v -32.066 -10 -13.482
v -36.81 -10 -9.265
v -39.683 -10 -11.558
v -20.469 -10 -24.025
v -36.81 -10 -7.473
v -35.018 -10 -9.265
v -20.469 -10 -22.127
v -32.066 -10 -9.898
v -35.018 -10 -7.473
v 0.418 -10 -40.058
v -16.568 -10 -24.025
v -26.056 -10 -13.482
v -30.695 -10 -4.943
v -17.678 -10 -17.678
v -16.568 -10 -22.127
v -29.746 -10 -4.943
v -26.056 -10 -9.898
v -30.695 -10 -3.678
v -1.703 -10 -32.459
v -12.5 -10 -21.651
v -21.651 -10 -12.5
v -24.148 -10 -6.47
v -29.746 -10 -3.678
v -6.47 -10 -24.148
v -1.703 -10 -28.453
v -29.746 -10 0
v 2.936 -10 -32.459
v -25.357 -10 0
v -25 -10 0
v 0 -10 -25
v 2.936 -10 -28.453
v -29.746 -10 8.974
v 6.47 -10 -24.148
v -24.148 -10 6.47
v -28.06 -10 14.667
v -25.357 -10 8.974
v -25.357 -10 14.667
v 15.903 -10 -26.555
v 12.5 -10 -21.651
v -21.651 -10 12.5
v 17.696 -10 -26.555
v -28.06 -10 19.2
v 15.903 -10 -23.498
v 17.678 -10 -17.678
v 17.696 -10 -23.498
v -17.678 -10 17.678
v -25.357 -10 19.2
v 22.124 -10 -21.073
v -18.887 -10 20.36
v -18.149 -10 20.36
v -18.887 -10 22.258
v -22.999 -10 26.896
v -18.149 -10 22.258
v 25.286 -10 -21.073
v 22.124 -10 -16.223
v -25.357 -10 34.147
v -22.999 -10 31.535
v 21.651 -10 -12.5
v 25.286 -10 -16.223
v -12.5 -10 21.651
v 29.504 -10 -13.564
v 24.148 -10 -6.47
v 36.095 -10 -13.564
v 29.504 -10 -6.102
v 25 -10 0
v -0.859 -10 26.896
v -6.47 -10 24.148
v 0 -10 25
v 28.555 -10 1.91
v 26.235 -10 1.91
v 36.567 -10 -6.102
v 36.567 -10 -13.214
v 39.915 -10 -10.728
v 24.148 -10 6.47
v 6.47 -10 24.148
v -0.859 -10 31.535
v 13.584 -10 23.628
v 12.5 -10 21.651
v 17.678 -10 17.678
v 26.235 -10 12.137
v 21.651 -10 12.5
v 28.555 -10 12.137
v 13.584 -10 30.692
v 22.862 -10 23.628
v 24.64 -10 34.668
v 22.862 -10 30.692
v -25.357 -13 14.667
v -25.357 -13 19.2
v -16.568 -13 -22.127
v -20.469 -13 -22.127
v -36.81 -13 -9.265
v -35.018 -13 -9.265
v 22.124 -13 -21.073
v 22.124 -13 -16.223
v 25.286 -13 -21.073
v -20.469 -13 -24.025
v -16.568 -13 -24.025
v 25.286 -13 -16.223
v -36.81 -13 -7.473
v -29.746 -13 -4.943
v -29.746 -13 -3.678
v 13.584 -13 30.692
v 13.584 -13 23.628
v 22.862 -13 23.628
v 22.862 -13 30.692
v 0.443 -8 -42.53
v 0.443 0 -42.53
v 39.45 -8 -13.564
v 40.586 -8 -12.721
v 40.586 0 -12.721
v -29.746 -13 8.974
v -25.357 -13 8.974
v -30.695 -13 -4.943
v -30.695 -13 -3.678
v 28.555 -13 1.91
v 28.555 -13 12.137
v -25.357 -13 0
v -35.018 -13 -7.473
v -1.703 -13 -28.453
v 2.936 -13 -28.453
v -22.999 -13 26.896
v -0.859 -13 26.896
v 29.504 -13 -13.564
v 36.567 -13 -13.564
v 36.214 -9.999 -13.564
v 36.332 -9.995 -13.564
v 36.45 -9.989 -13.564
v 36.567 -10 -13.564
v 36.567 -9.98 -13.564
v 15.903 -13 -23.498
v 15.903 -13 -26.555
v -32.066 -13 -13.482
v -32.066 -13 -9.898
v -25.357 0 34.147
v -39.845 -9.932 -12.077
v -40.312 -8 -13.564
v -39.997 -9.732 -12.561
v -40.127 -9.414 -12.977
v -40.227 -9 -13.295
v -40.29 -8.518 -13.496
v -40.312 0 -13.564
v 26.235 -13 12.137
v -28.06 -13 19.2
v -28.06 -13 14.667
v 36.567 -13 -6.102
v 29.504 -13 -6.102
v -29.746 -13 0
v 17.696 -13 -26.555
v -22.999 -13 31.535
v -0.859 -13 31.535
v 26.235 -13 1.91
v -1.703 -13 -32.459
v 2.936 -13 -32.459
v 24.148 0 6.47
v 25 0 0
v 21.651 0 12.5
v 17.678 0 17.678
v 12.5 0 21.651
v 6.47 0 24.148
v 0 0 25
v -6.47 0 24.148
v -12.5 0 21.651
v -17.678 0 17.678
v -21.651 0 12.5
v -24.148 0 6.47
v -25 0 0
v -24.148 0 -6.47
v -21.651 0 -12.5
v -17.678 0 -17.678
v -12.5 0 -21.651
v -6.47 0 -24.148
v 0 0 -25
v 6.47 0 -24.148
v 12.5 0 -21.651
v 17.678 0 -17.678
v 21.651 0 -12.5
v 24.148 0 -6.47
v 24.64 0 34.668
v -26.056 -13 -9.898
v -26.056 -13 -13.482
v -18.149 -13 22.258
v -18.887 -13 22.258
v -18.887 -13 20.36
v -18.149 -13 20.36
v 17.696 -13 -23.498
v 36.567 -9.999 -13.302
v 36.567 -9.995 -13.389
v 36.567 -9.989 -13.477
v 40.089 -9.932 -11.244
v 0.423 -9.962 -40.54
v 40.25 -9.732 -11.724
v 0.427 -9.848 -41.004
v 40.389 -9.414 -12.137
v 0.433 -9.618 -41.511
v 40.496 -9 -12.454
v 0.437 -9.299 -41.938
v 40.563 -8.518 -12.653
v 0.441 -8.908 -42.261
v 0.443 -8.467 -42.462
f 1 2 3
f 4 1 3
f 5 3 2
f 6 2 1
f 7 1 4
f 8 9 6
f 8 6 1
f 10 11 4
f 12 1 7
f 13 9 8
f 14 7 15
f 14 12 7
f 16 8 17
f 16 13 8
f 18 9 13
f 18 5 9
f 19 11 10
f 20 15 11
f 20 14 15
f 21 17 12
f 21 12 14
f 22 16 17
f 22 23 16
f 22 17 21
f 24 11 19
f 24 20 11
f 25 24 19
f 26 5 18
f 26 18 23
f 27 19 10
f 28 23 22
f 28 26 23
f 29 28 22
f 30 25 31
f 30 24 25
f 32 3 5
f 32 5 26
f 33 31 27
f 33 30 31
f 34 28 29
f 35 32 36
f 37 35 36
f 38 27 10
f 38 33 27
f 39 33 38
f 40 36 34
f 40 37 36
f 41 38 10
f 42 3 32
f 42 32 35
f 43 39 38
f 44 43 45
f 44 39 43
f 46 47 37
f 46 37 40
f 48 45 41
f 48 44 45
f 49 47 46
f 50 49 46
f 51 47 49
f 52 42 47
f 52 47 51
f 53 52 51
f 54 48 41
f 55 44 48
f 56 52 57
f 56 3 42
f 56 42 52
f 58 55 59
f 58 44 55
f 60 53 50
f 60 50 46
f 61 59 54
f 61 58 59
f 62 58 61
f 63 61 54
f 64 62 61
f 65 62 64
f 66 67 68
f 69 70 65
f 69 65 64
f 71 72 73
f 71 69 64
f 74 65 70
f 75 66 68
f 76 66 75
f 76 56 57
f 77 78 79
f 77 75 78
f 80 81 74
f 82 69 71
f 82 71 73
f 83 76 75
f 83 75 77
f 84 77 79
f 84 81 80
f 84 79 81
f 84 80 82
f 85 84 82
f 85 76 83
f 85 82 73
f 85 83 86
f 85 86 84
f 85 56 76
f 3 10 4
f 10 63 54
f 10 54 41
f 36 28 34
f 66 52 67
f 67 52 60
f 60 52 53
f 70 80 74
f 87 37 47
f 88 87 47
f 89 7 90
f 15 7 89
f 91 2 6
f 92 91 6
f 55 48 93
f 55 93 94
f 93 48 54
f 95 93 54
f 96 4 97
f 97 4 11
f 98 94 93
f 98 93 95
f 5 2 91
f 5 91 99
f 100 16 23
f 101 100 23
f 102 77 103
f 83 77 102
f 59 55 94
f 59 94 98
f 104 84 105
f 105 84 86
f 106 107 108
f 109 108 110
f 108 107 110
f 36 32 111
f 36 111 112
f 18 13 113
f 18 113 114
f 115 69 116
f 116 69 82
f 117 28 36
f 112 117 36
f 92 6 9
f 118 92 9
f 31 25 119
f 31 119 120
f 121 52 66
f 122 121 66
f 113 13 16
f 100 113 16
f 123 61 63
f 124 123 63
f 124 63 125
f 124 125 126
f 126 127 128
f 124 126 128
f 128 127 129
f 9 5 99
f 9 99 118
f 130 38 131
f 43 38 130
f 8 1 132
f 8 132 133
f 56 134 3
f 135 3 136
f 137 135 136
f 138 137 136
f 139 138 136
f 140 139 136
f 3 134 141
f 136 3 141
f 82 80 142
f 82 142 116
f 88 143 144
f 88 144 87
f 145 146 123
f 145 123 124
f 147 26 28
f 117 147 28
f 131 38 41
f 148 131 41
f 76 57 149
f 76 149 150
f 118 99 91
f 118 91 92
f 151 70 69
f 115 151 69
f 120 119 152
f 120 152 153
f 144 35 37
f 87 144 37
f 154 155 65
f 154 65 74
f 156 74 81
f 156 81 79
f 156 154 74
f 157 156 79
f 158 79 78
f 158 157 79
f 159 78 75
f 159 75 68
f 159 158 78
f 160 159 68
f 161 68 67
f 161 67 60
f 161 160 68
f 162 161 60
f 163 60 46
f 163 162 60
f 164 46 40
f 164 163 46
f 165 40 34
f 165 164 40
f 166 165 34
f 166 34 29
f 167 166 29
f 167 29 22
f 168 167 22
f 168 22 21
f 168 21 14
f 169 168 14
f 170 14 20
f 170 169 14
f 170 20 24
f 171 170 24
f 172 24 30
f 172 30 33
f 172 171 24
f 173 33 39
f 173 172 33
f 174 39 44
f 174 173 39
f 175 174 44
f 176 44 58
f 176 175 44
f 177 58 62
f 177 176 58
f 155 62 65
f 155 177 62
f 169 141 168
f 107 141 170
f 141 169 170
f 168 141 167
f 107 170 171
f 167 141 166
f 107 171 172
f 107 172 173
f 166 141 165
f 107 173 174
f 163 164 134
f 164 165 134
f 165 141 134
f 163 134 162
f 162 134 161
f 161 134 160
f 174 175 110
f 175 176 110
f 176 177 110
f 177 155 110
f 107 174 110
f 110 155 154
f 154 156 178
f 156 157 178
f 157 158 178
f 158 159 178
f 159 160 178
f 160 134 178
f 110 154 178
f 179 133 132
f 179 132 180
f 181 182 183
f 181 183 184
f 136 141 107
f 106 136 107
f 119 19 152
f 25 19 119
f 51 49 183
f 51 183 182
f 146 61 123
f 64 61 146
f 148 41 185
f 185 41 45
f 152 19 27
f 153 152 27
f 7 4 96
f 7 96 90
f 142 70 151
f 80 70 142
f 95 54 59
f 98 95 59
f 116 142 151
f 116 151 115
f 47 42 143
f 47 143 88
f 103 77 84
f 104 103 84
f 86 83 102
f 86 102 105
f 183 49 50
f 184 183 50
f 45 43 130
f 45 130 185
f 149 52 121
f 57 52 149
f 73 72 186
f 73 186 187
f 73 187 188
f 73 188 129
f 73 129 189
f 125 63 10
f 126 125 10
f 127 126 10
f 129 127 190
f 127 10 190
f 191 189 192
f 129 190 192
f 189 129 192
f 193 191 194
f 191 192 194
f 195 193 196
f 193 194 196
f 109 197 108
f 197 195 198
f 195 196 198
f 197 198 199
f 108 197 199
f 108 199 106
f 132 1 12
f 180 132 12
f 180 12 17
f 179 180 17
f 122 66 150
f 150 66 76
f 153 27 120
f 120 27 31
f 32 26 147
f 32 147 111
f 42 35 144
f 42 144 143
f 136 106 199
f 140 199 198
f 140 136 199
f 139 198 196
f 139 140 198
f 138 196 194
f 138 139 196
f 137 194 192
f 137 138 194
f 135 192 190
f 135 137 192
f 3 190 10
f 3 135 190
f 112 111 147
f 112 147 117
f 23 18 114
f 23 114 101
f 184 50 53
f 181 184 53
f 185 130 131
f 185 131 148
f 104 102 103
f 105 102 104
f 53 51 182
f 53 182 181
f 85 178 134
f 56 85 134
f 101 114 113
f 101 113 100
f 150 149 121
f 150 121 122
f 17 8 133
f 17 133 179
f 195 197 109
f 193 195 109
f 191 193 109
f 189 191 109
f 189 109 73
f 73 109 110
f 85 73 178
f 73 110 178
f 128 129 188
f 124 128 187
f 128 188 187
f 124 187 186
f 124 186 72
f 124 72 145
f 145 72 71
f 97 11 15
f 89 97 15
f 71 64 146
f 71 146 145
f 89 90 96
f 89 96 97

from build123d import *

# Parameters (mm, degrees)
F0_R         = 25
F1_DEPTH     = 10
F2_W         = 0.9488426149
F2_H         = 1.2651239522
F2_W_2       = 6.0093384236
F2_H_2       = 3.584517166
F2_W_3       = 3.9007980376
F2_H_3       = 1.8976870924
F2_W_4       = 4.6387878247
F2_H_4       = 4.0062256157
F2_W_5       = 1.7922576517
F2_H_5       = 3.0573830009
F2_W_6       = 7.0636067539
F2_H_6       = 7.4619053196
F2_W_7       = 3.1628105789
F2_H_7       = 4.8496406525
F2_W_8       = 2.3193918169
F2_H_8       = 10.2264162851
F2_W_9       = 9.2775728554
F2_H_9       = 7.0636067539
F2_W_10      = 22.1396633424
F2_H_10      = 4.6387854964
F2_W_11      = 2.7022243196
F2_H_11      = 4.5333597809
F2_W_12      = 0.7379893214
F2_H_12      = 1.8976833671
F2_W_13      = 4.3890562559
F2_H_13      = 8.9737139642
F2_W_14      = 1.7922595143
F2_H_14      = 1.7922581173
F3_DEPTH     = 3
F4_T1_DEPTH  = 60
F4_T6_DEPTH  = 60
F4_T12_DEPTH = 60
F4_T18_DEPTH = 60


# Not quite as in the source:
# - a fillet or chamfer that OpenCascade refuses, or shapes differently, is made with other operations: its cross-section is extruded or revolved along the edge and cut away or added


with BuildPart() as f1:
    # F0 (on Front) → F1 (new body)
    with BuildSketch(Plane.XZ):
        Polygon((-25.3573476618, 34.1470630352), (-40.3116381718, -13.5642479438), (0.4433851295, -42.5302292964), (40.5856652519, -12.7208793106), (24.6399354522, 34.6682935156), align=None)
        Circle(F0_R, mode=Mode.SUBTRACT)
    extrude(amount=F1_DEPTH)

    # F2 (on face) → F3 (join)
    with BuildSketch(Plane.XZ.offset(10)):
        with Locations((-30.2208252251, -4.310084274)):
            Rectangle(F2_W, F2_H)
        with Locations((-29.0611283854, -11.6899730638)):
            Rectangle(F2_W_2, F2_H_2)
        with Locations((-18.5184301808, -23.0760863051)):
            Rectangle(F2_W_3, F2_H_3)
        with Locations((0.6165653467, -30.455974862)):
            Rectangle(F2_W_4, F2_H_4)
        with Locations((16.7996054515, -25.0264853239)):
            Rectangle(F2_W_5, F2_H_5)
        with Locations((33.0353630707, -9.833295284)):
            Rectangle(F2_W_6, F2_H_6)
        with Locations((23.7050717697, -18.6481522396)):
            Rectangle(F2_W_7, F2_H_7)
        with Locations((27.3950155824, 7.0233154693)):
            Rectangle(F2_W_8, F2_H_8)
        with Locations((18.2228693739, 27.1598668769)):
            Rectangle(F2_W_9, F2_H_9)
        with Locations((-11.9292445015, 29.2156925425)):
            Rectangle(F2_W_10, F2_H_10)
        with Locations((-26.7084598216, 16.9334514067)):
            Rectangle(F2_W_11, F2_H_11)
        with Locations((-18.5184301808, 21.3086707518)):
            Rectangle(F2_W_12, F2_H_12)
        with Locations((-27.5518757897, 4.4868569821)):
            Rectangle(F2_W_13, F2_H_13)
        with Locations((-35.9138809144, -8.3690227475)):
            Rectangle(F2_W_14, F2_H_14)
    extrude(amount=F3_DEPTH)

    # F4: fillet of radius 2 on 2 edges, made by hand

    # F4_s2 → F4_t1 (cut)
    with BuildSketch(Plane(origin=(-24.4530139807, 0, 17.3795888115), x_dir=(0, 1, 0), z_dir=(0.815100466, 0, -0.5793196271))):
        with BuildLine():
            ThreePointArc((-8, -34.4095480118), (-9.4142135624, -33.8237615742), (-10, -32.4095480118))
            Line((-10, -32.4095480118), (-10, -34.4095480118))
            Line((-10, -34.4095480118), (-8, -34.4095480118))
        make_face()
    extrude(amount=F4_T1_DEPTH, mode=Mode.SUBTRACT)


with BuildPart() as f4_tool4:
    # F4_s5 → F4_t6 (new body)
    with BuildSketch(Plane(origin=(-24.0853680735, 0, -17.8856099914), x_dir=(0, 1, 0), z_dir=(0.8028456024, 0, 0.5961869997))):
        with BuildLine():
            ThreePointArc((-10, -32.4095480118), (-9.4142135624, -33.8237615742), (-8, -34.4095480118))
            Line((-8, -34.4095480118), (-10, -34.4095480118))
            Line((-10, -34.4095480118), (-10, -32.4095480118))
        make_face()
    extrude(amount=F4_T6_DEPTH)

    split(bisect_by=Plane.XY.offset(-13.5642479438), keep=Keep.BOTTOM)

    split(bisect_by=Plane.YZ.offset(36.5671664476), keep=Keep.BOTTOM)


with BuildPart() as f1_1:
    add(f1.part)

    # F4_t3: cut F4_tool4
    add(f4_tool4.part, mode=Mode.SUBTRACT)


with BuildPart() as f4_tool10:
    # F4_s11 → F4_t12 (new body)
    with BuildSketch(Plane(origin=(-24.0853680735, 0, -17.8856099914), x_dir=(0, 1, 0), z_dir=(0.8028456024, 0, 0.5961869997))):
        with BuildLine():
            ThreePointArc((-10, -32.4095480118), (-9.4142135624, -33.8237615742), (-8, -34.4095480118))
            Line((-8, -34.4095480118), (-10, -34.4095480118))
            Line((-10, -34.4095480118), (-10, -32.4095480118))
        make_face()
    extrude(amount=F4_T12_DEPTH)

    split(bisect_by=Plane.XY.offset(-13.5642479438), keep=Keep.BOTTOM)

    split(bisect_by=Plane.YZ.offset(36.5671664476), keep=Keep.TOP)


with BuildPart() as f1_2:
    add(f1_1.part)

    # F4_t9: cut F4_tool10
    add(f4_tool10.part, mode=Mode.SUBTRACT)


with BuildPart() as f4_tool16:
    # F4_s17 → F4_t18 (new body)
    with BuildSketch(Plane(origin=(-24.0853680735, 0, -17.8856099914), x_dir=(0, 1, 0), z_dir=(0.8028456024, 0, 0.5961869997))):
        with BuildLine():
            ThreePointArc((-10, -32.4095480118), (-9.4142135624, -33.8237615742), (-8, -34.4095480118))
            Line((-8, -34.4095480118), (-10, -34.4095480118))
            Line((-10, -34.4095480118), (-10, -32.4095480118))
        make_face()
    extrude(amount=F4_T18_DEPTH)

    split(bisect_by=Plane.XY.offset(-13.5642479438), keep=Keep.TOP)

    split(bisect_by=Plane.YZ.offset(36.5671664476), keep=Keep.TOP)


with BuildPart() as f1_3:
    add(f1_2.part)

    # F4_t15: cut F4_tool16
    add(f4_tool16.part, mode=Mode.SUBTRACT)


solid = f1_3.part
